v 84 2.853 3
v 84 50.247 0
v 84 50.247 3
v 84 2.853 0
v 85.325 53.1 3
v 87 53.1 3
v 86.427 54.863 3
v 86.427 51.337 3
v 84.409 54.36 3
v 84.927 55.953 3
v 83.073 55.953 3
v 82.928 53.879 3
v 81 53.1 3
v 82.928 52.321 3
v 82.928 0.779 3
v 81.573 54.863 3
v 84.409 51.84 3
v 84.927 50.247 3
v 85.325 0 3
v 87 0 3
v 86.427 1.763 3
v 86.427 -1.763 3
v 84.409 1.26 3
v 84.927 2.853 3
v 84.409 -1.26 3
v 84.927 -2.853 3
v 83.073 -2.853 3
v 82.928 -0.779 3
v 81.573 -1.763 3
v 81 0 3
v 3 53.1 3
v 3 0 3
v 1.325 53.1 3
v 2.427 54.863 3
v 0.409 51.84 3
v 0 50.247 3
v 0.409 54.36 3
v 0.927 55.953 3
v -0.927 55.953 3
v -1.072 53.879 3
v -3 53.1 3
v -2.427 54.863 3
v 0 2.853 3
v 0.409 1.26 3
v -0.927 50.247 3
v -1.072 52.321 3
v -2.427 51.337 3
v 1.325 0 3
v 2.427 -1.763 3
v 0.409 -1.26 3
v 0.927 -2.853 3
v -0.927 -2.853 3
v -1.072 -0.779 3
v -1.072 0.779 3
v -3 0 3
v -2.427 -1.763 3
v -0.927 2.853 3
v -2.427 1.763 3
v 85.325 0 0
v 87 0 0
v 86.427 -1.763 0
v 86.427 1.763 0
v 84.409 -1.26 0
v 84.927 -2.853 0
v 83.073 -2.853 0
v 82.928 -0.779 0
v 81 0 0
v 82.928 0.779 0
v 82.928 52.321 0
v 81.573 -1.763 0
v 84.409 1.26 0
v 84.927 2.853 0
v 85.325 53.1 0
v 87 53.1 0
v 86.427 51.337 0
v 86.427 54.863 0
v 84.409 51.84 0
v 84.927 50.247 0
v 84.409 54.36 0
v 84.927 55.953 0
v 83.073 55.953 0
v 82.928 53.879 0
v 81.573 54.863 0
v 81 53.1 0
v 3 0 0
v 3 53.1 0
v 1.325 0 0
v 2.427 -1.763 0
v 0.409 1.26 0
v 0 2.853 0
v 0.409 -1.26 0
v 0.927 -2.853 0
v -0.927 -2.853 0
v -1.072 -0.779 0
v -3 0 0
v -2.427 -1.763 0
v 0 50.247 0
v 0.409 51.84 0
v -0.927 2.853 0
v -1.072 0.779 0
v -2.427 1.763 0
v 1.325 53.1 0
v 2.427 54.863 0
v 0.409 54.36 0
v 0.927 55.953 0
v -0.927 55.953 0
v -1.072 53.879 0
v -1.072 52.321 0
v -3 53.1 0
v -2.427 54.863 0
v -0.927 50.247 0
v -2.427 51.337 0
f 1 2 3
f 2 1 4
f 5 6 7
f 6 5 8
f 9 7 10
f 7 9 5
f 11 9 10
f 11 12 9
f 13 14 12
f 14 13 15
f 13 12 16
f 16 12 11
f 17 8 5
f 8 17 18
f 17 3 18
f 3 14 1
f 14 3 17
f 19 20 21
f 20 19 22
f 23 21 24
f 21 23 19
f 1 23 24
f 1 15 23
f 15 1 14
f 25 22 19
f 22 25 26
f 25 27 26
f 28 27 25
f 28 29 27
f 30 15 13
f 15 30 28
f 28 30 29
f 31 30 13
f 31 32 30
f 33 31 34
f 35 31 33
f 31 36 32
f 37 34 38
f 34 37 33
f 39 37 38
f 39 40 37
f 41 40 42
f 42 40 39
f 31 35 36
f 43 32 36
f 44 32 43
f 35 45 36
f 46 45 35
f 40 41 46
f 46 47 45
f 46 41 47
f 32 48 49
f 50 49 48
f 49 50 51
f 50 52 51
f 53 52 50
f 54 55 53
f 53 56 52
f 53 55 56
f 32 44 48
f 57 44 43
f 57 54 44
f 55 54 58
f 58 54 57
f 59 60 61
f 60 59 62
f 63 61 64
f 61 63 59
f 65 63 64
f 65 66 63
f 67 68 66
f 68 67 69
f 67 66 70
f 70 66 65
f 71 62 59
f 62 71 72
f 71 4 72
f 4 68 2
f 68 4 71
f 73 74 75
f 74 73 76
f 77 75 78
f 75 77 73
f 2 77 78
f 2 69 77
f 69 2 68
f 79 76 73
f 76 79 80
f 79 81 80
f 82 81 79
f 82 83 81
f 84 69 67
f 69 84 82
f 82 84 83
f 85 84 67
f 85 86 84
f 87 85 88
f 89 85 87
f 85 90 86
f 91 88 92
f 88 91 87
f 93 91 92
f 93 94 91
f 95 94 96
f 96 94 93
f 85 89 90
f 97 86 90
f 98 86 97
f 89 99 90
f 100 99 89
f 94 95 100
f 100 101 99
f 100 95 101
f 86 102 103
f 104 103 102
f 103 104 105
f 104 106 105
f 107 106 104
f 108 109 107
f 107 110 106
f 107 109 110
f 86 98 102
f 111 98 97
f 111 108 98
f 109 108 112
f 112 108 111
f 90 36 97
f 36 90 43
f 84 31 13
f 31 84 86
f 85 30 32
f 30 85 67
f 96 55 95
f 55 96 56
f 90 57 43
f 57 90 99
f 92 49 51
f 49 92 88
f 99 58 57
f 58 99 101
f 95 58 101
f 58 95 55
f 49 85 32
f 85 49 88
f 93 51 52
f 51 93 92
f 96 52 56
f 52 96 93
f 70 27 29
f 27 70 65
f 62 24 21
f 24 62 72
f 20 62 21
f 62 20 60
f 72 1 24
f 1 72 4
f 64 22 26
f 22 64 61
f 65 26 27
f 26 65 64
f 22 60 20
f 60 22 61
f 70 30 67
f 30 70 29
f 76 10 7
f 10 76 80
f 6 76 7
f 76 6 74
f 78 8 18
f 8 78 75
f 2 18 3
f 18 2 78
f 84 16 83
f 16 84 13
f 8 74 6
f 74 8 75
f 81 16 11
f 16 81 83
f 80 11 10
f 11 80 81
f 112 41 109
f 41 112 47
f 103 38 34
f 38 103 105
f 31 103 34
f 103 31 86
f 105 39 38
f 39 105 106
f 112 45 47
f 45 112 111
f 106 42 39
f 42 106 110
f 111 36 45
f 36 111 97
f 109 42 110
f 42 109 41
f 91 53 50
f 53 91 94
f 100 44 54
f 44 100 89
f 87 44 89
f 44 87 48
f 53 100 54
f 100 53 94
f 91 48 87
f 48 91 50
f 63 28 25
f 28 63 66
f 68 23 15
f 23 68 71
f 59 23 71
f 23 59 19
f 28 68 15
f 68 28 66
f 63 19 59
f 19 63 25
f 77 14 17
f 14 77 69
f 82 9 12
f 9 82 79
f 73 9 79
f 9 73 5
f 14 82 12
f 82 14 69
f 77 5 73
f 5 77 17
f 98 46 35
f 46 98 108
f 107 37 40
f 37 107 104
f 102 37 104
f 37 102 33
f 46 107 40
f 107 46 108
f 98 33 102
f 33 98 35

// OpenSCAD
poe_x = 81;
poe_y = 28.25;
poe_z = 17;

poe_ether_y_offset = .5;
poe_ether_y_width = 18.5;
poe_ether_z_offset = 3.25;
poe_ether_z_height = 14.75;

sonar_x = 45;
sonar_y = 20.35;
sonar_z = 1.5;

sonar_diameter = 16;
sonar_edge = 2;
sonar_plug_width = 12.75;
sonar_plug_height = 15.3;

pump_cable = 3.5;
sensor_cable = 3.5;

wall_thickness = 1.5;
post_diameter = 6;
post_hole = 2.65;

difference(){
// Body
union(){
cube([poe_x + wall_thickness * 2,
      poe_y + sonar_y + wall_thickness * 3,
      sonar_z + wall_thickness]);
// Corner Posts
cylinder(d = post_diameter, h = sonar_z + wall_thickness);
translate([poe_x + wall_thickness * 2, 0, 0]){
cylinder(d = post_diameter, h = sonar_z + wall_thickness);    
}
translate([poe_x + wall_thickness * 2, poe_y + sonar_y + wall_thickness * 3, 0]){
cylinder(d = post_diameter, h = sonar_z + wall_thickness);    
}
translate([0, poe_y + sonar_y + wall_thickness * 3, 0]){
cylinder(d = post_diameter, h = sonar_z + wall_thickness);    
}
}
// Corner Holes
translate([0,0,-1]){
cylinder(d = post_hole, h = sonar_z + wall_thickness + 2);
}
translate([poe_x + wall_thickness * 2, 0, -1]){
cylinder(d = post_hole, h = sonar_z + wall_thickness + 2);    
}
translate([poe_x + wall_thickness * 2, poe_y + sonar_y + wall_thickness * 3, -1]){
cylinder(d = post_hole, h = sonar_z + wall_thickness + 2);    
}
translate([0, poe_y + sonar_y + wall_thickness * 3, -1]){
cylinder(d = post_hole, h = sonar_z + wall_thickness + 2);    
}
}
